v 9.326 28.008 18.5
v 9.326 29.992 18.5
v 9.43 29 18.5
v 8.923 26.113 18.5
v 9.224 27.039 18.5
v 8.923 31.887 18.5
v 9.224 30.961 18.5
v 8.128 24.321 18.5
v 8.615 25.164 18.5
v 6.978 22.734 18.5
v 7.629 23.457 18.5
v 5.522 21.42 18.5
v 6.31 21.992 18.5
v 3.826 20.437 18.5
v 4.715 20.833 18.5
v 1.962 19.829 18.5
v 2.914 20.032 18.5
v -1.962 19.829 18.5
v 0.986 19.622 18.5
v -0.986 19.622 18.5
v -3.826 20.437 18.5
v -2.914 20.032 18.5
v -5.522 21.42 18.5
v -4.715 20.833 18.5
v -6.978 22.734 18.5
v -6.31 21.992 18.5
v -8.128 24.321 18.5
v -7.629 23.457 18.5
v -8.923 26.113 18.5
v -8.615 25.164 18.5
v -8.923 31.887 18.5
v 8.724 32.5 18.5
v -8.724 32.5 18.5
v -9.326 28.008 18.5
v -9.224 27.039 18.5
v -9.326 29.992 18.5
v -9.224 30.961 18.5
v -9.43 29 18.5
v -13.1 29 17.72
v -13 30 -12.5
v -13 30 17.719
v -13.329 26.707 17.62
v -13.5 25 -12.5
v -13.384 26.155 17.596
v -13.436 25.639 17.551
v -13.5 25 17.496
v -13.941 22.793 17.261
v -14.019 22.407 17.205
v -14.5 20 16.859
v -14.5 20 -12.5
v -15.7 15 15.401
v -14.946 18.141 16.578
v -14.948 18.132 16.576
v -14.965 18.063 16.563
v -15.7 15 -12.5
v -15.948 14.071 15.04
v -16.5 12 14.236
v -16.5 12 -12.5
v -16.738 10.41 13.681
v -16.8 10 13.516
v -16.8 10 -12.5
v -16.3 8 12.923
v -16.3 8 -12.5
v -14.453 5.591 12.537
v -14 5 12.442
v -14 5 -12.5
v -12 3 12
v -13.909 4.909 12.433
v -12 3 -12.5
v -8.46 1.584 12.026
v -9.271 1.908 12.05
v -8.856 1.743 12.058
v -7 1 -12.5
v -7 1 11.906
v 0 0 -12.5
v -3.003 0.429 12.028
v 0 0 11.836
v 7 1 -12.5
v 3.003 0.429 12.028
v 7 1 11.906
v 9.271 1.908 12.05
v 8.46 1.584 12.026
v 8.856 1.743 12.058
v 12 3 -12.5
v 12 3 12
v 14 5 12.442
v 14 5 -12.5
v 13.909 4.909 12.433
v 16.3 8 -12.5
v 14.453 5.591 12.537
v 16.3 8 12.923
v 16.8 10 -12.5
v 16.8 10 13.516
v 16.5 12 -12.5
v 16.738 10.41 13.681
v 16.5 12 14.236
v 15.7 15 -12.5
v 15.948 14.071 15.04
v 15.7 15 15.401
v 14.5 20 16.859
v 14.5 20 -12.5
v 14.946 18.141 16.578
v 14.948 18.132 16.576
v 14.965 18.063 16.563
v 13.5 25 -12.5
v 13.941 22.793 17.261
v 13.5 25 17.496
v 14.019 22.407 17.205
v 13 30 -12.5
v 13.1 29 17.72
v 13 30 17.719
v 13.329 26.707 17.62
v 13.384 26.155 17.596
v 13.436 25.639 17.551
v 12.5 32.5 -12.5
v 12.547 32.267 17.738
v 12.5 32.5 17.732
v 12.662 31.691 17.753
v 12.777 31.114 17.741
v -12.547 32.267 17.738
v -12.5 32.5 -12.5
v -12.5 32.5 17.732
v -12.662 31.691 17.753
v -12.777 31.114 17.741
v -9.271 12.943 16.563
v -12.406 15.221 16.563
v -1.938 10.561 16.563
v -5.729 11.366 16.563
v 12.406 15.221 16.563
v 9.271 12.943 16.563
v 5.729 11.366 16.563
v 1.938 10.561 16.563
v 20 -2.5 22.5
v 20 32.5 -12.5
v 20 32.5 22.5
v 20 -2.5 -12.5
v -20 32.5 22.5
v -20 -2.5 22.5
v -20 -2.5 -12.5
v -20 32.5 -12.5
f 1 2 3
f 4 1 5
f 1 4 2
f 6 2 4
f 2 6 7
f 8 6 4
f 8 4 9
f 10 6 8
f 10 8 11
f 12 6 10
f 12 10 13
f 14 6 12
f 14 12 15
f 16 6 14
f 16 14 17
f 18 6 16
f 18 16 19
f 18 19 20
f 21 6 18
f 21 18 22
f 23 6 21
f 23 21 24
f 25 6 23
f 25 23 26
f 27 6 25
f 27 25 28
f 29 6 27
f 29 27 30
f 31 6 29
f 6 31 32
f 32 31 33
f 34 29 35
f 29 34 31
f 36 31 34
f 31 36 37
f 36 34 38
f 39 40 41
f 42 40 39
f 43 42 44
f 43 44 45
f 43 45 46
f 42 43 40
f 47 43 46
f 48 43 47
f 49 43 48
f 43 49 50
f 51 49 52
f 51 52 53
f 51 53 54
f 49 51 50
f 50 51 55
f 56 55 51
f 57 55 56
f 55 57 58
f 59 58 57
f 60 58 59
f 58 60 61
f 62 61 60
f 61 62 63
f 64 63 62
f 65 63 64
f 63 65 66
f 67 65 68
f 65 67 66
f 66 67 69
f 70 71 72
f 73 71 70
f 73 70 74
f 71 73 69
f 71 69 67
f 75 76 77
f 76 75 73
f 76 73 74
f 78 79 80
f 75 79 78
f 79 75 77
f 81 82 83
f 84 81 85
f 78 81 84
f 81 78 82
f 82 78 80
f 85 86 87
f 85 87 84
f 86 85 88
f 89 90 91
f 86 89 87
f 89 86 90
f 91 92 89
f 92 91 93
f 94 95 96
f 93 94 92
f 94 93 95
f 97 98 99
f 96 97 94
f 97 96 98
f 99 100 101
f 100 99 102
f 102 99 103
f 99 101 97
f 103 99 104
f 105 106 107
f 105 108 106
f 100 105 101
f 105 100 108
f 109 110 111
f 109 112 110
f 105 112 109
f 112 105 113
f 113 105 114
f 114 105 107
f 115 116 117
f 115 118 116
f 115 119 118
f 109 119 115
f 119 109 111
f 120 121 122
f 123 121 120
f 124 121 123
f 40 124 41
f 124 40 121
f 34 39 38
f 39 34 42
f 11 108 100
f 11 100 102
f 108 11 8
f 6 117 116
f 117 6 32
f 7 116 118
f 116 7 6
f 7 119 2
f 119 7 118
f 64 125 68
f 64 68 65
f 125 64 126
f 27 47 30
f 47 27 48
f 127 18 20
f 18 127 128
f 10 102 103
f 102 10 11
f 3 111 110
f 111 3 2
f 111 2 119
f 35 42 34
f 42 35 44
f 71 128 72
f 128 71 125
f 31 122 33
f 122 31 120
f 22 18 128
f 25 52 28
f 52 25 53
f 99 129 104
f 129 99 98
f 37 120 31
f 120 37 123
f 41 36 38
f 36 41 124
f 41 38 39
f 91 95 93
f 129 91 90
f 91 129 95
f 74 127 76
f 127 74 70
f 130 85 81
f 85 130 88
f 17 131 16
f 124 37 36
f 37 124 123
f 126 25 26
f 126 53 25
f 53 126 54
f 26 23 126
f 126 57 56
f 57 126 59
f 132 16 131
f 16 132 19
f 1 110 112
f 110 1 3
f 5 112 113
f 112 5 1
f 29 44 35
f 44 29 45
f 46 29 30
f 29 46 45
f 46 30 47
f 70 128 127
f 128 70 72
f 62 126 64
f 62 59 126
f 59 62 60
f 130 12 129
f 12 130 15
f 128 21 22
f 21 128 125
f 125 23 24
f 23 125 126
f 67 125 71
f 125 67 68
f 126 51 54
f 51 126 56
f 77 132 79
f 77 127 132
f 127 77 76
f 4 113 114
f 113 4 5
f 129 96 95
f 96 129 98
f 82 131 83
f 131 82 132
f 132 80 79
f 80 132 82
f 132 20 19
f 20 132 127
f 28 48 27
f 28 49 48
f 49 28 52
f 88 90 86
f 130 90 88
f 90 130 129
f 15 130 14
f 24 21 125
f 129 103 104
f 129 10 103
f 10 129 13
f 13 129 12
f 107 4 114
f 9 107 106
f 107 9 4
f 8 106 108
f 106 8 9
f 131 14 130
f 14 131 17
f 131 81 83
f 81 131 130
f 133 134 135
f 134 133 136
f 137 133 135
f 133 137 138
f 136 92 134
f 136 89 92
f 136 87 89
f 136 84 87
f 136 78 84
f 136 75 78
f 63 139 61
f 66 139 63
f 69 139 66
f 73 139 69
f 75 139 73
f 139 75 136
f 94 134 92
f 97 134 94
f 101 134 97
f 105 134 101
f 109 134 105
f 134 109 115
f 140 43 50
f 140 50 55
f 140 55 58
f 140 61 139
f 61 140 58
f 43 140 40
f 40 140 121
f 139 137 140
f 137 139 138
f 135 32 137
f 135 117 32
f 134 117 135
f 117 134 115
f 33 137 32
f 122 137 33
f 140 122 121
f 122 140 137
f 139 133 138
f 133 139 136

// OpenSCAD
$fn =30;
existingHandleThickness = 37;

module existingHalfContour() {
    polygon([[0,0],
        [7,1],
        [9.5,2],
        [12,3],
        [13,4],
        [14,5],
        [16.3,8],
        [16.8,10],
        [16.5,12],
        [15.7,15],
        [14.5,20],
        [13.5,25],
        [13,30],
        [12,35],
        [0,35]]);
}

module existingXY() {
    linear_extrude(height = existingHandleThickness, center=true)
        union() {
            existingHalfContour();
            mirror([1,0,0])
                existingHalfContour();
        }
}

module existingHalfZ() {
    radius = 60;
    translate([0,29,-40.5])
        sphere(r = radius);
}

module existingHandle() {
    intersection(){
        existingXY();
        existingHalfZ();
    }
}

difference() {
    translate([0,15,5])
        cube([40,35,35],center = true);
    existingHandle();
}
